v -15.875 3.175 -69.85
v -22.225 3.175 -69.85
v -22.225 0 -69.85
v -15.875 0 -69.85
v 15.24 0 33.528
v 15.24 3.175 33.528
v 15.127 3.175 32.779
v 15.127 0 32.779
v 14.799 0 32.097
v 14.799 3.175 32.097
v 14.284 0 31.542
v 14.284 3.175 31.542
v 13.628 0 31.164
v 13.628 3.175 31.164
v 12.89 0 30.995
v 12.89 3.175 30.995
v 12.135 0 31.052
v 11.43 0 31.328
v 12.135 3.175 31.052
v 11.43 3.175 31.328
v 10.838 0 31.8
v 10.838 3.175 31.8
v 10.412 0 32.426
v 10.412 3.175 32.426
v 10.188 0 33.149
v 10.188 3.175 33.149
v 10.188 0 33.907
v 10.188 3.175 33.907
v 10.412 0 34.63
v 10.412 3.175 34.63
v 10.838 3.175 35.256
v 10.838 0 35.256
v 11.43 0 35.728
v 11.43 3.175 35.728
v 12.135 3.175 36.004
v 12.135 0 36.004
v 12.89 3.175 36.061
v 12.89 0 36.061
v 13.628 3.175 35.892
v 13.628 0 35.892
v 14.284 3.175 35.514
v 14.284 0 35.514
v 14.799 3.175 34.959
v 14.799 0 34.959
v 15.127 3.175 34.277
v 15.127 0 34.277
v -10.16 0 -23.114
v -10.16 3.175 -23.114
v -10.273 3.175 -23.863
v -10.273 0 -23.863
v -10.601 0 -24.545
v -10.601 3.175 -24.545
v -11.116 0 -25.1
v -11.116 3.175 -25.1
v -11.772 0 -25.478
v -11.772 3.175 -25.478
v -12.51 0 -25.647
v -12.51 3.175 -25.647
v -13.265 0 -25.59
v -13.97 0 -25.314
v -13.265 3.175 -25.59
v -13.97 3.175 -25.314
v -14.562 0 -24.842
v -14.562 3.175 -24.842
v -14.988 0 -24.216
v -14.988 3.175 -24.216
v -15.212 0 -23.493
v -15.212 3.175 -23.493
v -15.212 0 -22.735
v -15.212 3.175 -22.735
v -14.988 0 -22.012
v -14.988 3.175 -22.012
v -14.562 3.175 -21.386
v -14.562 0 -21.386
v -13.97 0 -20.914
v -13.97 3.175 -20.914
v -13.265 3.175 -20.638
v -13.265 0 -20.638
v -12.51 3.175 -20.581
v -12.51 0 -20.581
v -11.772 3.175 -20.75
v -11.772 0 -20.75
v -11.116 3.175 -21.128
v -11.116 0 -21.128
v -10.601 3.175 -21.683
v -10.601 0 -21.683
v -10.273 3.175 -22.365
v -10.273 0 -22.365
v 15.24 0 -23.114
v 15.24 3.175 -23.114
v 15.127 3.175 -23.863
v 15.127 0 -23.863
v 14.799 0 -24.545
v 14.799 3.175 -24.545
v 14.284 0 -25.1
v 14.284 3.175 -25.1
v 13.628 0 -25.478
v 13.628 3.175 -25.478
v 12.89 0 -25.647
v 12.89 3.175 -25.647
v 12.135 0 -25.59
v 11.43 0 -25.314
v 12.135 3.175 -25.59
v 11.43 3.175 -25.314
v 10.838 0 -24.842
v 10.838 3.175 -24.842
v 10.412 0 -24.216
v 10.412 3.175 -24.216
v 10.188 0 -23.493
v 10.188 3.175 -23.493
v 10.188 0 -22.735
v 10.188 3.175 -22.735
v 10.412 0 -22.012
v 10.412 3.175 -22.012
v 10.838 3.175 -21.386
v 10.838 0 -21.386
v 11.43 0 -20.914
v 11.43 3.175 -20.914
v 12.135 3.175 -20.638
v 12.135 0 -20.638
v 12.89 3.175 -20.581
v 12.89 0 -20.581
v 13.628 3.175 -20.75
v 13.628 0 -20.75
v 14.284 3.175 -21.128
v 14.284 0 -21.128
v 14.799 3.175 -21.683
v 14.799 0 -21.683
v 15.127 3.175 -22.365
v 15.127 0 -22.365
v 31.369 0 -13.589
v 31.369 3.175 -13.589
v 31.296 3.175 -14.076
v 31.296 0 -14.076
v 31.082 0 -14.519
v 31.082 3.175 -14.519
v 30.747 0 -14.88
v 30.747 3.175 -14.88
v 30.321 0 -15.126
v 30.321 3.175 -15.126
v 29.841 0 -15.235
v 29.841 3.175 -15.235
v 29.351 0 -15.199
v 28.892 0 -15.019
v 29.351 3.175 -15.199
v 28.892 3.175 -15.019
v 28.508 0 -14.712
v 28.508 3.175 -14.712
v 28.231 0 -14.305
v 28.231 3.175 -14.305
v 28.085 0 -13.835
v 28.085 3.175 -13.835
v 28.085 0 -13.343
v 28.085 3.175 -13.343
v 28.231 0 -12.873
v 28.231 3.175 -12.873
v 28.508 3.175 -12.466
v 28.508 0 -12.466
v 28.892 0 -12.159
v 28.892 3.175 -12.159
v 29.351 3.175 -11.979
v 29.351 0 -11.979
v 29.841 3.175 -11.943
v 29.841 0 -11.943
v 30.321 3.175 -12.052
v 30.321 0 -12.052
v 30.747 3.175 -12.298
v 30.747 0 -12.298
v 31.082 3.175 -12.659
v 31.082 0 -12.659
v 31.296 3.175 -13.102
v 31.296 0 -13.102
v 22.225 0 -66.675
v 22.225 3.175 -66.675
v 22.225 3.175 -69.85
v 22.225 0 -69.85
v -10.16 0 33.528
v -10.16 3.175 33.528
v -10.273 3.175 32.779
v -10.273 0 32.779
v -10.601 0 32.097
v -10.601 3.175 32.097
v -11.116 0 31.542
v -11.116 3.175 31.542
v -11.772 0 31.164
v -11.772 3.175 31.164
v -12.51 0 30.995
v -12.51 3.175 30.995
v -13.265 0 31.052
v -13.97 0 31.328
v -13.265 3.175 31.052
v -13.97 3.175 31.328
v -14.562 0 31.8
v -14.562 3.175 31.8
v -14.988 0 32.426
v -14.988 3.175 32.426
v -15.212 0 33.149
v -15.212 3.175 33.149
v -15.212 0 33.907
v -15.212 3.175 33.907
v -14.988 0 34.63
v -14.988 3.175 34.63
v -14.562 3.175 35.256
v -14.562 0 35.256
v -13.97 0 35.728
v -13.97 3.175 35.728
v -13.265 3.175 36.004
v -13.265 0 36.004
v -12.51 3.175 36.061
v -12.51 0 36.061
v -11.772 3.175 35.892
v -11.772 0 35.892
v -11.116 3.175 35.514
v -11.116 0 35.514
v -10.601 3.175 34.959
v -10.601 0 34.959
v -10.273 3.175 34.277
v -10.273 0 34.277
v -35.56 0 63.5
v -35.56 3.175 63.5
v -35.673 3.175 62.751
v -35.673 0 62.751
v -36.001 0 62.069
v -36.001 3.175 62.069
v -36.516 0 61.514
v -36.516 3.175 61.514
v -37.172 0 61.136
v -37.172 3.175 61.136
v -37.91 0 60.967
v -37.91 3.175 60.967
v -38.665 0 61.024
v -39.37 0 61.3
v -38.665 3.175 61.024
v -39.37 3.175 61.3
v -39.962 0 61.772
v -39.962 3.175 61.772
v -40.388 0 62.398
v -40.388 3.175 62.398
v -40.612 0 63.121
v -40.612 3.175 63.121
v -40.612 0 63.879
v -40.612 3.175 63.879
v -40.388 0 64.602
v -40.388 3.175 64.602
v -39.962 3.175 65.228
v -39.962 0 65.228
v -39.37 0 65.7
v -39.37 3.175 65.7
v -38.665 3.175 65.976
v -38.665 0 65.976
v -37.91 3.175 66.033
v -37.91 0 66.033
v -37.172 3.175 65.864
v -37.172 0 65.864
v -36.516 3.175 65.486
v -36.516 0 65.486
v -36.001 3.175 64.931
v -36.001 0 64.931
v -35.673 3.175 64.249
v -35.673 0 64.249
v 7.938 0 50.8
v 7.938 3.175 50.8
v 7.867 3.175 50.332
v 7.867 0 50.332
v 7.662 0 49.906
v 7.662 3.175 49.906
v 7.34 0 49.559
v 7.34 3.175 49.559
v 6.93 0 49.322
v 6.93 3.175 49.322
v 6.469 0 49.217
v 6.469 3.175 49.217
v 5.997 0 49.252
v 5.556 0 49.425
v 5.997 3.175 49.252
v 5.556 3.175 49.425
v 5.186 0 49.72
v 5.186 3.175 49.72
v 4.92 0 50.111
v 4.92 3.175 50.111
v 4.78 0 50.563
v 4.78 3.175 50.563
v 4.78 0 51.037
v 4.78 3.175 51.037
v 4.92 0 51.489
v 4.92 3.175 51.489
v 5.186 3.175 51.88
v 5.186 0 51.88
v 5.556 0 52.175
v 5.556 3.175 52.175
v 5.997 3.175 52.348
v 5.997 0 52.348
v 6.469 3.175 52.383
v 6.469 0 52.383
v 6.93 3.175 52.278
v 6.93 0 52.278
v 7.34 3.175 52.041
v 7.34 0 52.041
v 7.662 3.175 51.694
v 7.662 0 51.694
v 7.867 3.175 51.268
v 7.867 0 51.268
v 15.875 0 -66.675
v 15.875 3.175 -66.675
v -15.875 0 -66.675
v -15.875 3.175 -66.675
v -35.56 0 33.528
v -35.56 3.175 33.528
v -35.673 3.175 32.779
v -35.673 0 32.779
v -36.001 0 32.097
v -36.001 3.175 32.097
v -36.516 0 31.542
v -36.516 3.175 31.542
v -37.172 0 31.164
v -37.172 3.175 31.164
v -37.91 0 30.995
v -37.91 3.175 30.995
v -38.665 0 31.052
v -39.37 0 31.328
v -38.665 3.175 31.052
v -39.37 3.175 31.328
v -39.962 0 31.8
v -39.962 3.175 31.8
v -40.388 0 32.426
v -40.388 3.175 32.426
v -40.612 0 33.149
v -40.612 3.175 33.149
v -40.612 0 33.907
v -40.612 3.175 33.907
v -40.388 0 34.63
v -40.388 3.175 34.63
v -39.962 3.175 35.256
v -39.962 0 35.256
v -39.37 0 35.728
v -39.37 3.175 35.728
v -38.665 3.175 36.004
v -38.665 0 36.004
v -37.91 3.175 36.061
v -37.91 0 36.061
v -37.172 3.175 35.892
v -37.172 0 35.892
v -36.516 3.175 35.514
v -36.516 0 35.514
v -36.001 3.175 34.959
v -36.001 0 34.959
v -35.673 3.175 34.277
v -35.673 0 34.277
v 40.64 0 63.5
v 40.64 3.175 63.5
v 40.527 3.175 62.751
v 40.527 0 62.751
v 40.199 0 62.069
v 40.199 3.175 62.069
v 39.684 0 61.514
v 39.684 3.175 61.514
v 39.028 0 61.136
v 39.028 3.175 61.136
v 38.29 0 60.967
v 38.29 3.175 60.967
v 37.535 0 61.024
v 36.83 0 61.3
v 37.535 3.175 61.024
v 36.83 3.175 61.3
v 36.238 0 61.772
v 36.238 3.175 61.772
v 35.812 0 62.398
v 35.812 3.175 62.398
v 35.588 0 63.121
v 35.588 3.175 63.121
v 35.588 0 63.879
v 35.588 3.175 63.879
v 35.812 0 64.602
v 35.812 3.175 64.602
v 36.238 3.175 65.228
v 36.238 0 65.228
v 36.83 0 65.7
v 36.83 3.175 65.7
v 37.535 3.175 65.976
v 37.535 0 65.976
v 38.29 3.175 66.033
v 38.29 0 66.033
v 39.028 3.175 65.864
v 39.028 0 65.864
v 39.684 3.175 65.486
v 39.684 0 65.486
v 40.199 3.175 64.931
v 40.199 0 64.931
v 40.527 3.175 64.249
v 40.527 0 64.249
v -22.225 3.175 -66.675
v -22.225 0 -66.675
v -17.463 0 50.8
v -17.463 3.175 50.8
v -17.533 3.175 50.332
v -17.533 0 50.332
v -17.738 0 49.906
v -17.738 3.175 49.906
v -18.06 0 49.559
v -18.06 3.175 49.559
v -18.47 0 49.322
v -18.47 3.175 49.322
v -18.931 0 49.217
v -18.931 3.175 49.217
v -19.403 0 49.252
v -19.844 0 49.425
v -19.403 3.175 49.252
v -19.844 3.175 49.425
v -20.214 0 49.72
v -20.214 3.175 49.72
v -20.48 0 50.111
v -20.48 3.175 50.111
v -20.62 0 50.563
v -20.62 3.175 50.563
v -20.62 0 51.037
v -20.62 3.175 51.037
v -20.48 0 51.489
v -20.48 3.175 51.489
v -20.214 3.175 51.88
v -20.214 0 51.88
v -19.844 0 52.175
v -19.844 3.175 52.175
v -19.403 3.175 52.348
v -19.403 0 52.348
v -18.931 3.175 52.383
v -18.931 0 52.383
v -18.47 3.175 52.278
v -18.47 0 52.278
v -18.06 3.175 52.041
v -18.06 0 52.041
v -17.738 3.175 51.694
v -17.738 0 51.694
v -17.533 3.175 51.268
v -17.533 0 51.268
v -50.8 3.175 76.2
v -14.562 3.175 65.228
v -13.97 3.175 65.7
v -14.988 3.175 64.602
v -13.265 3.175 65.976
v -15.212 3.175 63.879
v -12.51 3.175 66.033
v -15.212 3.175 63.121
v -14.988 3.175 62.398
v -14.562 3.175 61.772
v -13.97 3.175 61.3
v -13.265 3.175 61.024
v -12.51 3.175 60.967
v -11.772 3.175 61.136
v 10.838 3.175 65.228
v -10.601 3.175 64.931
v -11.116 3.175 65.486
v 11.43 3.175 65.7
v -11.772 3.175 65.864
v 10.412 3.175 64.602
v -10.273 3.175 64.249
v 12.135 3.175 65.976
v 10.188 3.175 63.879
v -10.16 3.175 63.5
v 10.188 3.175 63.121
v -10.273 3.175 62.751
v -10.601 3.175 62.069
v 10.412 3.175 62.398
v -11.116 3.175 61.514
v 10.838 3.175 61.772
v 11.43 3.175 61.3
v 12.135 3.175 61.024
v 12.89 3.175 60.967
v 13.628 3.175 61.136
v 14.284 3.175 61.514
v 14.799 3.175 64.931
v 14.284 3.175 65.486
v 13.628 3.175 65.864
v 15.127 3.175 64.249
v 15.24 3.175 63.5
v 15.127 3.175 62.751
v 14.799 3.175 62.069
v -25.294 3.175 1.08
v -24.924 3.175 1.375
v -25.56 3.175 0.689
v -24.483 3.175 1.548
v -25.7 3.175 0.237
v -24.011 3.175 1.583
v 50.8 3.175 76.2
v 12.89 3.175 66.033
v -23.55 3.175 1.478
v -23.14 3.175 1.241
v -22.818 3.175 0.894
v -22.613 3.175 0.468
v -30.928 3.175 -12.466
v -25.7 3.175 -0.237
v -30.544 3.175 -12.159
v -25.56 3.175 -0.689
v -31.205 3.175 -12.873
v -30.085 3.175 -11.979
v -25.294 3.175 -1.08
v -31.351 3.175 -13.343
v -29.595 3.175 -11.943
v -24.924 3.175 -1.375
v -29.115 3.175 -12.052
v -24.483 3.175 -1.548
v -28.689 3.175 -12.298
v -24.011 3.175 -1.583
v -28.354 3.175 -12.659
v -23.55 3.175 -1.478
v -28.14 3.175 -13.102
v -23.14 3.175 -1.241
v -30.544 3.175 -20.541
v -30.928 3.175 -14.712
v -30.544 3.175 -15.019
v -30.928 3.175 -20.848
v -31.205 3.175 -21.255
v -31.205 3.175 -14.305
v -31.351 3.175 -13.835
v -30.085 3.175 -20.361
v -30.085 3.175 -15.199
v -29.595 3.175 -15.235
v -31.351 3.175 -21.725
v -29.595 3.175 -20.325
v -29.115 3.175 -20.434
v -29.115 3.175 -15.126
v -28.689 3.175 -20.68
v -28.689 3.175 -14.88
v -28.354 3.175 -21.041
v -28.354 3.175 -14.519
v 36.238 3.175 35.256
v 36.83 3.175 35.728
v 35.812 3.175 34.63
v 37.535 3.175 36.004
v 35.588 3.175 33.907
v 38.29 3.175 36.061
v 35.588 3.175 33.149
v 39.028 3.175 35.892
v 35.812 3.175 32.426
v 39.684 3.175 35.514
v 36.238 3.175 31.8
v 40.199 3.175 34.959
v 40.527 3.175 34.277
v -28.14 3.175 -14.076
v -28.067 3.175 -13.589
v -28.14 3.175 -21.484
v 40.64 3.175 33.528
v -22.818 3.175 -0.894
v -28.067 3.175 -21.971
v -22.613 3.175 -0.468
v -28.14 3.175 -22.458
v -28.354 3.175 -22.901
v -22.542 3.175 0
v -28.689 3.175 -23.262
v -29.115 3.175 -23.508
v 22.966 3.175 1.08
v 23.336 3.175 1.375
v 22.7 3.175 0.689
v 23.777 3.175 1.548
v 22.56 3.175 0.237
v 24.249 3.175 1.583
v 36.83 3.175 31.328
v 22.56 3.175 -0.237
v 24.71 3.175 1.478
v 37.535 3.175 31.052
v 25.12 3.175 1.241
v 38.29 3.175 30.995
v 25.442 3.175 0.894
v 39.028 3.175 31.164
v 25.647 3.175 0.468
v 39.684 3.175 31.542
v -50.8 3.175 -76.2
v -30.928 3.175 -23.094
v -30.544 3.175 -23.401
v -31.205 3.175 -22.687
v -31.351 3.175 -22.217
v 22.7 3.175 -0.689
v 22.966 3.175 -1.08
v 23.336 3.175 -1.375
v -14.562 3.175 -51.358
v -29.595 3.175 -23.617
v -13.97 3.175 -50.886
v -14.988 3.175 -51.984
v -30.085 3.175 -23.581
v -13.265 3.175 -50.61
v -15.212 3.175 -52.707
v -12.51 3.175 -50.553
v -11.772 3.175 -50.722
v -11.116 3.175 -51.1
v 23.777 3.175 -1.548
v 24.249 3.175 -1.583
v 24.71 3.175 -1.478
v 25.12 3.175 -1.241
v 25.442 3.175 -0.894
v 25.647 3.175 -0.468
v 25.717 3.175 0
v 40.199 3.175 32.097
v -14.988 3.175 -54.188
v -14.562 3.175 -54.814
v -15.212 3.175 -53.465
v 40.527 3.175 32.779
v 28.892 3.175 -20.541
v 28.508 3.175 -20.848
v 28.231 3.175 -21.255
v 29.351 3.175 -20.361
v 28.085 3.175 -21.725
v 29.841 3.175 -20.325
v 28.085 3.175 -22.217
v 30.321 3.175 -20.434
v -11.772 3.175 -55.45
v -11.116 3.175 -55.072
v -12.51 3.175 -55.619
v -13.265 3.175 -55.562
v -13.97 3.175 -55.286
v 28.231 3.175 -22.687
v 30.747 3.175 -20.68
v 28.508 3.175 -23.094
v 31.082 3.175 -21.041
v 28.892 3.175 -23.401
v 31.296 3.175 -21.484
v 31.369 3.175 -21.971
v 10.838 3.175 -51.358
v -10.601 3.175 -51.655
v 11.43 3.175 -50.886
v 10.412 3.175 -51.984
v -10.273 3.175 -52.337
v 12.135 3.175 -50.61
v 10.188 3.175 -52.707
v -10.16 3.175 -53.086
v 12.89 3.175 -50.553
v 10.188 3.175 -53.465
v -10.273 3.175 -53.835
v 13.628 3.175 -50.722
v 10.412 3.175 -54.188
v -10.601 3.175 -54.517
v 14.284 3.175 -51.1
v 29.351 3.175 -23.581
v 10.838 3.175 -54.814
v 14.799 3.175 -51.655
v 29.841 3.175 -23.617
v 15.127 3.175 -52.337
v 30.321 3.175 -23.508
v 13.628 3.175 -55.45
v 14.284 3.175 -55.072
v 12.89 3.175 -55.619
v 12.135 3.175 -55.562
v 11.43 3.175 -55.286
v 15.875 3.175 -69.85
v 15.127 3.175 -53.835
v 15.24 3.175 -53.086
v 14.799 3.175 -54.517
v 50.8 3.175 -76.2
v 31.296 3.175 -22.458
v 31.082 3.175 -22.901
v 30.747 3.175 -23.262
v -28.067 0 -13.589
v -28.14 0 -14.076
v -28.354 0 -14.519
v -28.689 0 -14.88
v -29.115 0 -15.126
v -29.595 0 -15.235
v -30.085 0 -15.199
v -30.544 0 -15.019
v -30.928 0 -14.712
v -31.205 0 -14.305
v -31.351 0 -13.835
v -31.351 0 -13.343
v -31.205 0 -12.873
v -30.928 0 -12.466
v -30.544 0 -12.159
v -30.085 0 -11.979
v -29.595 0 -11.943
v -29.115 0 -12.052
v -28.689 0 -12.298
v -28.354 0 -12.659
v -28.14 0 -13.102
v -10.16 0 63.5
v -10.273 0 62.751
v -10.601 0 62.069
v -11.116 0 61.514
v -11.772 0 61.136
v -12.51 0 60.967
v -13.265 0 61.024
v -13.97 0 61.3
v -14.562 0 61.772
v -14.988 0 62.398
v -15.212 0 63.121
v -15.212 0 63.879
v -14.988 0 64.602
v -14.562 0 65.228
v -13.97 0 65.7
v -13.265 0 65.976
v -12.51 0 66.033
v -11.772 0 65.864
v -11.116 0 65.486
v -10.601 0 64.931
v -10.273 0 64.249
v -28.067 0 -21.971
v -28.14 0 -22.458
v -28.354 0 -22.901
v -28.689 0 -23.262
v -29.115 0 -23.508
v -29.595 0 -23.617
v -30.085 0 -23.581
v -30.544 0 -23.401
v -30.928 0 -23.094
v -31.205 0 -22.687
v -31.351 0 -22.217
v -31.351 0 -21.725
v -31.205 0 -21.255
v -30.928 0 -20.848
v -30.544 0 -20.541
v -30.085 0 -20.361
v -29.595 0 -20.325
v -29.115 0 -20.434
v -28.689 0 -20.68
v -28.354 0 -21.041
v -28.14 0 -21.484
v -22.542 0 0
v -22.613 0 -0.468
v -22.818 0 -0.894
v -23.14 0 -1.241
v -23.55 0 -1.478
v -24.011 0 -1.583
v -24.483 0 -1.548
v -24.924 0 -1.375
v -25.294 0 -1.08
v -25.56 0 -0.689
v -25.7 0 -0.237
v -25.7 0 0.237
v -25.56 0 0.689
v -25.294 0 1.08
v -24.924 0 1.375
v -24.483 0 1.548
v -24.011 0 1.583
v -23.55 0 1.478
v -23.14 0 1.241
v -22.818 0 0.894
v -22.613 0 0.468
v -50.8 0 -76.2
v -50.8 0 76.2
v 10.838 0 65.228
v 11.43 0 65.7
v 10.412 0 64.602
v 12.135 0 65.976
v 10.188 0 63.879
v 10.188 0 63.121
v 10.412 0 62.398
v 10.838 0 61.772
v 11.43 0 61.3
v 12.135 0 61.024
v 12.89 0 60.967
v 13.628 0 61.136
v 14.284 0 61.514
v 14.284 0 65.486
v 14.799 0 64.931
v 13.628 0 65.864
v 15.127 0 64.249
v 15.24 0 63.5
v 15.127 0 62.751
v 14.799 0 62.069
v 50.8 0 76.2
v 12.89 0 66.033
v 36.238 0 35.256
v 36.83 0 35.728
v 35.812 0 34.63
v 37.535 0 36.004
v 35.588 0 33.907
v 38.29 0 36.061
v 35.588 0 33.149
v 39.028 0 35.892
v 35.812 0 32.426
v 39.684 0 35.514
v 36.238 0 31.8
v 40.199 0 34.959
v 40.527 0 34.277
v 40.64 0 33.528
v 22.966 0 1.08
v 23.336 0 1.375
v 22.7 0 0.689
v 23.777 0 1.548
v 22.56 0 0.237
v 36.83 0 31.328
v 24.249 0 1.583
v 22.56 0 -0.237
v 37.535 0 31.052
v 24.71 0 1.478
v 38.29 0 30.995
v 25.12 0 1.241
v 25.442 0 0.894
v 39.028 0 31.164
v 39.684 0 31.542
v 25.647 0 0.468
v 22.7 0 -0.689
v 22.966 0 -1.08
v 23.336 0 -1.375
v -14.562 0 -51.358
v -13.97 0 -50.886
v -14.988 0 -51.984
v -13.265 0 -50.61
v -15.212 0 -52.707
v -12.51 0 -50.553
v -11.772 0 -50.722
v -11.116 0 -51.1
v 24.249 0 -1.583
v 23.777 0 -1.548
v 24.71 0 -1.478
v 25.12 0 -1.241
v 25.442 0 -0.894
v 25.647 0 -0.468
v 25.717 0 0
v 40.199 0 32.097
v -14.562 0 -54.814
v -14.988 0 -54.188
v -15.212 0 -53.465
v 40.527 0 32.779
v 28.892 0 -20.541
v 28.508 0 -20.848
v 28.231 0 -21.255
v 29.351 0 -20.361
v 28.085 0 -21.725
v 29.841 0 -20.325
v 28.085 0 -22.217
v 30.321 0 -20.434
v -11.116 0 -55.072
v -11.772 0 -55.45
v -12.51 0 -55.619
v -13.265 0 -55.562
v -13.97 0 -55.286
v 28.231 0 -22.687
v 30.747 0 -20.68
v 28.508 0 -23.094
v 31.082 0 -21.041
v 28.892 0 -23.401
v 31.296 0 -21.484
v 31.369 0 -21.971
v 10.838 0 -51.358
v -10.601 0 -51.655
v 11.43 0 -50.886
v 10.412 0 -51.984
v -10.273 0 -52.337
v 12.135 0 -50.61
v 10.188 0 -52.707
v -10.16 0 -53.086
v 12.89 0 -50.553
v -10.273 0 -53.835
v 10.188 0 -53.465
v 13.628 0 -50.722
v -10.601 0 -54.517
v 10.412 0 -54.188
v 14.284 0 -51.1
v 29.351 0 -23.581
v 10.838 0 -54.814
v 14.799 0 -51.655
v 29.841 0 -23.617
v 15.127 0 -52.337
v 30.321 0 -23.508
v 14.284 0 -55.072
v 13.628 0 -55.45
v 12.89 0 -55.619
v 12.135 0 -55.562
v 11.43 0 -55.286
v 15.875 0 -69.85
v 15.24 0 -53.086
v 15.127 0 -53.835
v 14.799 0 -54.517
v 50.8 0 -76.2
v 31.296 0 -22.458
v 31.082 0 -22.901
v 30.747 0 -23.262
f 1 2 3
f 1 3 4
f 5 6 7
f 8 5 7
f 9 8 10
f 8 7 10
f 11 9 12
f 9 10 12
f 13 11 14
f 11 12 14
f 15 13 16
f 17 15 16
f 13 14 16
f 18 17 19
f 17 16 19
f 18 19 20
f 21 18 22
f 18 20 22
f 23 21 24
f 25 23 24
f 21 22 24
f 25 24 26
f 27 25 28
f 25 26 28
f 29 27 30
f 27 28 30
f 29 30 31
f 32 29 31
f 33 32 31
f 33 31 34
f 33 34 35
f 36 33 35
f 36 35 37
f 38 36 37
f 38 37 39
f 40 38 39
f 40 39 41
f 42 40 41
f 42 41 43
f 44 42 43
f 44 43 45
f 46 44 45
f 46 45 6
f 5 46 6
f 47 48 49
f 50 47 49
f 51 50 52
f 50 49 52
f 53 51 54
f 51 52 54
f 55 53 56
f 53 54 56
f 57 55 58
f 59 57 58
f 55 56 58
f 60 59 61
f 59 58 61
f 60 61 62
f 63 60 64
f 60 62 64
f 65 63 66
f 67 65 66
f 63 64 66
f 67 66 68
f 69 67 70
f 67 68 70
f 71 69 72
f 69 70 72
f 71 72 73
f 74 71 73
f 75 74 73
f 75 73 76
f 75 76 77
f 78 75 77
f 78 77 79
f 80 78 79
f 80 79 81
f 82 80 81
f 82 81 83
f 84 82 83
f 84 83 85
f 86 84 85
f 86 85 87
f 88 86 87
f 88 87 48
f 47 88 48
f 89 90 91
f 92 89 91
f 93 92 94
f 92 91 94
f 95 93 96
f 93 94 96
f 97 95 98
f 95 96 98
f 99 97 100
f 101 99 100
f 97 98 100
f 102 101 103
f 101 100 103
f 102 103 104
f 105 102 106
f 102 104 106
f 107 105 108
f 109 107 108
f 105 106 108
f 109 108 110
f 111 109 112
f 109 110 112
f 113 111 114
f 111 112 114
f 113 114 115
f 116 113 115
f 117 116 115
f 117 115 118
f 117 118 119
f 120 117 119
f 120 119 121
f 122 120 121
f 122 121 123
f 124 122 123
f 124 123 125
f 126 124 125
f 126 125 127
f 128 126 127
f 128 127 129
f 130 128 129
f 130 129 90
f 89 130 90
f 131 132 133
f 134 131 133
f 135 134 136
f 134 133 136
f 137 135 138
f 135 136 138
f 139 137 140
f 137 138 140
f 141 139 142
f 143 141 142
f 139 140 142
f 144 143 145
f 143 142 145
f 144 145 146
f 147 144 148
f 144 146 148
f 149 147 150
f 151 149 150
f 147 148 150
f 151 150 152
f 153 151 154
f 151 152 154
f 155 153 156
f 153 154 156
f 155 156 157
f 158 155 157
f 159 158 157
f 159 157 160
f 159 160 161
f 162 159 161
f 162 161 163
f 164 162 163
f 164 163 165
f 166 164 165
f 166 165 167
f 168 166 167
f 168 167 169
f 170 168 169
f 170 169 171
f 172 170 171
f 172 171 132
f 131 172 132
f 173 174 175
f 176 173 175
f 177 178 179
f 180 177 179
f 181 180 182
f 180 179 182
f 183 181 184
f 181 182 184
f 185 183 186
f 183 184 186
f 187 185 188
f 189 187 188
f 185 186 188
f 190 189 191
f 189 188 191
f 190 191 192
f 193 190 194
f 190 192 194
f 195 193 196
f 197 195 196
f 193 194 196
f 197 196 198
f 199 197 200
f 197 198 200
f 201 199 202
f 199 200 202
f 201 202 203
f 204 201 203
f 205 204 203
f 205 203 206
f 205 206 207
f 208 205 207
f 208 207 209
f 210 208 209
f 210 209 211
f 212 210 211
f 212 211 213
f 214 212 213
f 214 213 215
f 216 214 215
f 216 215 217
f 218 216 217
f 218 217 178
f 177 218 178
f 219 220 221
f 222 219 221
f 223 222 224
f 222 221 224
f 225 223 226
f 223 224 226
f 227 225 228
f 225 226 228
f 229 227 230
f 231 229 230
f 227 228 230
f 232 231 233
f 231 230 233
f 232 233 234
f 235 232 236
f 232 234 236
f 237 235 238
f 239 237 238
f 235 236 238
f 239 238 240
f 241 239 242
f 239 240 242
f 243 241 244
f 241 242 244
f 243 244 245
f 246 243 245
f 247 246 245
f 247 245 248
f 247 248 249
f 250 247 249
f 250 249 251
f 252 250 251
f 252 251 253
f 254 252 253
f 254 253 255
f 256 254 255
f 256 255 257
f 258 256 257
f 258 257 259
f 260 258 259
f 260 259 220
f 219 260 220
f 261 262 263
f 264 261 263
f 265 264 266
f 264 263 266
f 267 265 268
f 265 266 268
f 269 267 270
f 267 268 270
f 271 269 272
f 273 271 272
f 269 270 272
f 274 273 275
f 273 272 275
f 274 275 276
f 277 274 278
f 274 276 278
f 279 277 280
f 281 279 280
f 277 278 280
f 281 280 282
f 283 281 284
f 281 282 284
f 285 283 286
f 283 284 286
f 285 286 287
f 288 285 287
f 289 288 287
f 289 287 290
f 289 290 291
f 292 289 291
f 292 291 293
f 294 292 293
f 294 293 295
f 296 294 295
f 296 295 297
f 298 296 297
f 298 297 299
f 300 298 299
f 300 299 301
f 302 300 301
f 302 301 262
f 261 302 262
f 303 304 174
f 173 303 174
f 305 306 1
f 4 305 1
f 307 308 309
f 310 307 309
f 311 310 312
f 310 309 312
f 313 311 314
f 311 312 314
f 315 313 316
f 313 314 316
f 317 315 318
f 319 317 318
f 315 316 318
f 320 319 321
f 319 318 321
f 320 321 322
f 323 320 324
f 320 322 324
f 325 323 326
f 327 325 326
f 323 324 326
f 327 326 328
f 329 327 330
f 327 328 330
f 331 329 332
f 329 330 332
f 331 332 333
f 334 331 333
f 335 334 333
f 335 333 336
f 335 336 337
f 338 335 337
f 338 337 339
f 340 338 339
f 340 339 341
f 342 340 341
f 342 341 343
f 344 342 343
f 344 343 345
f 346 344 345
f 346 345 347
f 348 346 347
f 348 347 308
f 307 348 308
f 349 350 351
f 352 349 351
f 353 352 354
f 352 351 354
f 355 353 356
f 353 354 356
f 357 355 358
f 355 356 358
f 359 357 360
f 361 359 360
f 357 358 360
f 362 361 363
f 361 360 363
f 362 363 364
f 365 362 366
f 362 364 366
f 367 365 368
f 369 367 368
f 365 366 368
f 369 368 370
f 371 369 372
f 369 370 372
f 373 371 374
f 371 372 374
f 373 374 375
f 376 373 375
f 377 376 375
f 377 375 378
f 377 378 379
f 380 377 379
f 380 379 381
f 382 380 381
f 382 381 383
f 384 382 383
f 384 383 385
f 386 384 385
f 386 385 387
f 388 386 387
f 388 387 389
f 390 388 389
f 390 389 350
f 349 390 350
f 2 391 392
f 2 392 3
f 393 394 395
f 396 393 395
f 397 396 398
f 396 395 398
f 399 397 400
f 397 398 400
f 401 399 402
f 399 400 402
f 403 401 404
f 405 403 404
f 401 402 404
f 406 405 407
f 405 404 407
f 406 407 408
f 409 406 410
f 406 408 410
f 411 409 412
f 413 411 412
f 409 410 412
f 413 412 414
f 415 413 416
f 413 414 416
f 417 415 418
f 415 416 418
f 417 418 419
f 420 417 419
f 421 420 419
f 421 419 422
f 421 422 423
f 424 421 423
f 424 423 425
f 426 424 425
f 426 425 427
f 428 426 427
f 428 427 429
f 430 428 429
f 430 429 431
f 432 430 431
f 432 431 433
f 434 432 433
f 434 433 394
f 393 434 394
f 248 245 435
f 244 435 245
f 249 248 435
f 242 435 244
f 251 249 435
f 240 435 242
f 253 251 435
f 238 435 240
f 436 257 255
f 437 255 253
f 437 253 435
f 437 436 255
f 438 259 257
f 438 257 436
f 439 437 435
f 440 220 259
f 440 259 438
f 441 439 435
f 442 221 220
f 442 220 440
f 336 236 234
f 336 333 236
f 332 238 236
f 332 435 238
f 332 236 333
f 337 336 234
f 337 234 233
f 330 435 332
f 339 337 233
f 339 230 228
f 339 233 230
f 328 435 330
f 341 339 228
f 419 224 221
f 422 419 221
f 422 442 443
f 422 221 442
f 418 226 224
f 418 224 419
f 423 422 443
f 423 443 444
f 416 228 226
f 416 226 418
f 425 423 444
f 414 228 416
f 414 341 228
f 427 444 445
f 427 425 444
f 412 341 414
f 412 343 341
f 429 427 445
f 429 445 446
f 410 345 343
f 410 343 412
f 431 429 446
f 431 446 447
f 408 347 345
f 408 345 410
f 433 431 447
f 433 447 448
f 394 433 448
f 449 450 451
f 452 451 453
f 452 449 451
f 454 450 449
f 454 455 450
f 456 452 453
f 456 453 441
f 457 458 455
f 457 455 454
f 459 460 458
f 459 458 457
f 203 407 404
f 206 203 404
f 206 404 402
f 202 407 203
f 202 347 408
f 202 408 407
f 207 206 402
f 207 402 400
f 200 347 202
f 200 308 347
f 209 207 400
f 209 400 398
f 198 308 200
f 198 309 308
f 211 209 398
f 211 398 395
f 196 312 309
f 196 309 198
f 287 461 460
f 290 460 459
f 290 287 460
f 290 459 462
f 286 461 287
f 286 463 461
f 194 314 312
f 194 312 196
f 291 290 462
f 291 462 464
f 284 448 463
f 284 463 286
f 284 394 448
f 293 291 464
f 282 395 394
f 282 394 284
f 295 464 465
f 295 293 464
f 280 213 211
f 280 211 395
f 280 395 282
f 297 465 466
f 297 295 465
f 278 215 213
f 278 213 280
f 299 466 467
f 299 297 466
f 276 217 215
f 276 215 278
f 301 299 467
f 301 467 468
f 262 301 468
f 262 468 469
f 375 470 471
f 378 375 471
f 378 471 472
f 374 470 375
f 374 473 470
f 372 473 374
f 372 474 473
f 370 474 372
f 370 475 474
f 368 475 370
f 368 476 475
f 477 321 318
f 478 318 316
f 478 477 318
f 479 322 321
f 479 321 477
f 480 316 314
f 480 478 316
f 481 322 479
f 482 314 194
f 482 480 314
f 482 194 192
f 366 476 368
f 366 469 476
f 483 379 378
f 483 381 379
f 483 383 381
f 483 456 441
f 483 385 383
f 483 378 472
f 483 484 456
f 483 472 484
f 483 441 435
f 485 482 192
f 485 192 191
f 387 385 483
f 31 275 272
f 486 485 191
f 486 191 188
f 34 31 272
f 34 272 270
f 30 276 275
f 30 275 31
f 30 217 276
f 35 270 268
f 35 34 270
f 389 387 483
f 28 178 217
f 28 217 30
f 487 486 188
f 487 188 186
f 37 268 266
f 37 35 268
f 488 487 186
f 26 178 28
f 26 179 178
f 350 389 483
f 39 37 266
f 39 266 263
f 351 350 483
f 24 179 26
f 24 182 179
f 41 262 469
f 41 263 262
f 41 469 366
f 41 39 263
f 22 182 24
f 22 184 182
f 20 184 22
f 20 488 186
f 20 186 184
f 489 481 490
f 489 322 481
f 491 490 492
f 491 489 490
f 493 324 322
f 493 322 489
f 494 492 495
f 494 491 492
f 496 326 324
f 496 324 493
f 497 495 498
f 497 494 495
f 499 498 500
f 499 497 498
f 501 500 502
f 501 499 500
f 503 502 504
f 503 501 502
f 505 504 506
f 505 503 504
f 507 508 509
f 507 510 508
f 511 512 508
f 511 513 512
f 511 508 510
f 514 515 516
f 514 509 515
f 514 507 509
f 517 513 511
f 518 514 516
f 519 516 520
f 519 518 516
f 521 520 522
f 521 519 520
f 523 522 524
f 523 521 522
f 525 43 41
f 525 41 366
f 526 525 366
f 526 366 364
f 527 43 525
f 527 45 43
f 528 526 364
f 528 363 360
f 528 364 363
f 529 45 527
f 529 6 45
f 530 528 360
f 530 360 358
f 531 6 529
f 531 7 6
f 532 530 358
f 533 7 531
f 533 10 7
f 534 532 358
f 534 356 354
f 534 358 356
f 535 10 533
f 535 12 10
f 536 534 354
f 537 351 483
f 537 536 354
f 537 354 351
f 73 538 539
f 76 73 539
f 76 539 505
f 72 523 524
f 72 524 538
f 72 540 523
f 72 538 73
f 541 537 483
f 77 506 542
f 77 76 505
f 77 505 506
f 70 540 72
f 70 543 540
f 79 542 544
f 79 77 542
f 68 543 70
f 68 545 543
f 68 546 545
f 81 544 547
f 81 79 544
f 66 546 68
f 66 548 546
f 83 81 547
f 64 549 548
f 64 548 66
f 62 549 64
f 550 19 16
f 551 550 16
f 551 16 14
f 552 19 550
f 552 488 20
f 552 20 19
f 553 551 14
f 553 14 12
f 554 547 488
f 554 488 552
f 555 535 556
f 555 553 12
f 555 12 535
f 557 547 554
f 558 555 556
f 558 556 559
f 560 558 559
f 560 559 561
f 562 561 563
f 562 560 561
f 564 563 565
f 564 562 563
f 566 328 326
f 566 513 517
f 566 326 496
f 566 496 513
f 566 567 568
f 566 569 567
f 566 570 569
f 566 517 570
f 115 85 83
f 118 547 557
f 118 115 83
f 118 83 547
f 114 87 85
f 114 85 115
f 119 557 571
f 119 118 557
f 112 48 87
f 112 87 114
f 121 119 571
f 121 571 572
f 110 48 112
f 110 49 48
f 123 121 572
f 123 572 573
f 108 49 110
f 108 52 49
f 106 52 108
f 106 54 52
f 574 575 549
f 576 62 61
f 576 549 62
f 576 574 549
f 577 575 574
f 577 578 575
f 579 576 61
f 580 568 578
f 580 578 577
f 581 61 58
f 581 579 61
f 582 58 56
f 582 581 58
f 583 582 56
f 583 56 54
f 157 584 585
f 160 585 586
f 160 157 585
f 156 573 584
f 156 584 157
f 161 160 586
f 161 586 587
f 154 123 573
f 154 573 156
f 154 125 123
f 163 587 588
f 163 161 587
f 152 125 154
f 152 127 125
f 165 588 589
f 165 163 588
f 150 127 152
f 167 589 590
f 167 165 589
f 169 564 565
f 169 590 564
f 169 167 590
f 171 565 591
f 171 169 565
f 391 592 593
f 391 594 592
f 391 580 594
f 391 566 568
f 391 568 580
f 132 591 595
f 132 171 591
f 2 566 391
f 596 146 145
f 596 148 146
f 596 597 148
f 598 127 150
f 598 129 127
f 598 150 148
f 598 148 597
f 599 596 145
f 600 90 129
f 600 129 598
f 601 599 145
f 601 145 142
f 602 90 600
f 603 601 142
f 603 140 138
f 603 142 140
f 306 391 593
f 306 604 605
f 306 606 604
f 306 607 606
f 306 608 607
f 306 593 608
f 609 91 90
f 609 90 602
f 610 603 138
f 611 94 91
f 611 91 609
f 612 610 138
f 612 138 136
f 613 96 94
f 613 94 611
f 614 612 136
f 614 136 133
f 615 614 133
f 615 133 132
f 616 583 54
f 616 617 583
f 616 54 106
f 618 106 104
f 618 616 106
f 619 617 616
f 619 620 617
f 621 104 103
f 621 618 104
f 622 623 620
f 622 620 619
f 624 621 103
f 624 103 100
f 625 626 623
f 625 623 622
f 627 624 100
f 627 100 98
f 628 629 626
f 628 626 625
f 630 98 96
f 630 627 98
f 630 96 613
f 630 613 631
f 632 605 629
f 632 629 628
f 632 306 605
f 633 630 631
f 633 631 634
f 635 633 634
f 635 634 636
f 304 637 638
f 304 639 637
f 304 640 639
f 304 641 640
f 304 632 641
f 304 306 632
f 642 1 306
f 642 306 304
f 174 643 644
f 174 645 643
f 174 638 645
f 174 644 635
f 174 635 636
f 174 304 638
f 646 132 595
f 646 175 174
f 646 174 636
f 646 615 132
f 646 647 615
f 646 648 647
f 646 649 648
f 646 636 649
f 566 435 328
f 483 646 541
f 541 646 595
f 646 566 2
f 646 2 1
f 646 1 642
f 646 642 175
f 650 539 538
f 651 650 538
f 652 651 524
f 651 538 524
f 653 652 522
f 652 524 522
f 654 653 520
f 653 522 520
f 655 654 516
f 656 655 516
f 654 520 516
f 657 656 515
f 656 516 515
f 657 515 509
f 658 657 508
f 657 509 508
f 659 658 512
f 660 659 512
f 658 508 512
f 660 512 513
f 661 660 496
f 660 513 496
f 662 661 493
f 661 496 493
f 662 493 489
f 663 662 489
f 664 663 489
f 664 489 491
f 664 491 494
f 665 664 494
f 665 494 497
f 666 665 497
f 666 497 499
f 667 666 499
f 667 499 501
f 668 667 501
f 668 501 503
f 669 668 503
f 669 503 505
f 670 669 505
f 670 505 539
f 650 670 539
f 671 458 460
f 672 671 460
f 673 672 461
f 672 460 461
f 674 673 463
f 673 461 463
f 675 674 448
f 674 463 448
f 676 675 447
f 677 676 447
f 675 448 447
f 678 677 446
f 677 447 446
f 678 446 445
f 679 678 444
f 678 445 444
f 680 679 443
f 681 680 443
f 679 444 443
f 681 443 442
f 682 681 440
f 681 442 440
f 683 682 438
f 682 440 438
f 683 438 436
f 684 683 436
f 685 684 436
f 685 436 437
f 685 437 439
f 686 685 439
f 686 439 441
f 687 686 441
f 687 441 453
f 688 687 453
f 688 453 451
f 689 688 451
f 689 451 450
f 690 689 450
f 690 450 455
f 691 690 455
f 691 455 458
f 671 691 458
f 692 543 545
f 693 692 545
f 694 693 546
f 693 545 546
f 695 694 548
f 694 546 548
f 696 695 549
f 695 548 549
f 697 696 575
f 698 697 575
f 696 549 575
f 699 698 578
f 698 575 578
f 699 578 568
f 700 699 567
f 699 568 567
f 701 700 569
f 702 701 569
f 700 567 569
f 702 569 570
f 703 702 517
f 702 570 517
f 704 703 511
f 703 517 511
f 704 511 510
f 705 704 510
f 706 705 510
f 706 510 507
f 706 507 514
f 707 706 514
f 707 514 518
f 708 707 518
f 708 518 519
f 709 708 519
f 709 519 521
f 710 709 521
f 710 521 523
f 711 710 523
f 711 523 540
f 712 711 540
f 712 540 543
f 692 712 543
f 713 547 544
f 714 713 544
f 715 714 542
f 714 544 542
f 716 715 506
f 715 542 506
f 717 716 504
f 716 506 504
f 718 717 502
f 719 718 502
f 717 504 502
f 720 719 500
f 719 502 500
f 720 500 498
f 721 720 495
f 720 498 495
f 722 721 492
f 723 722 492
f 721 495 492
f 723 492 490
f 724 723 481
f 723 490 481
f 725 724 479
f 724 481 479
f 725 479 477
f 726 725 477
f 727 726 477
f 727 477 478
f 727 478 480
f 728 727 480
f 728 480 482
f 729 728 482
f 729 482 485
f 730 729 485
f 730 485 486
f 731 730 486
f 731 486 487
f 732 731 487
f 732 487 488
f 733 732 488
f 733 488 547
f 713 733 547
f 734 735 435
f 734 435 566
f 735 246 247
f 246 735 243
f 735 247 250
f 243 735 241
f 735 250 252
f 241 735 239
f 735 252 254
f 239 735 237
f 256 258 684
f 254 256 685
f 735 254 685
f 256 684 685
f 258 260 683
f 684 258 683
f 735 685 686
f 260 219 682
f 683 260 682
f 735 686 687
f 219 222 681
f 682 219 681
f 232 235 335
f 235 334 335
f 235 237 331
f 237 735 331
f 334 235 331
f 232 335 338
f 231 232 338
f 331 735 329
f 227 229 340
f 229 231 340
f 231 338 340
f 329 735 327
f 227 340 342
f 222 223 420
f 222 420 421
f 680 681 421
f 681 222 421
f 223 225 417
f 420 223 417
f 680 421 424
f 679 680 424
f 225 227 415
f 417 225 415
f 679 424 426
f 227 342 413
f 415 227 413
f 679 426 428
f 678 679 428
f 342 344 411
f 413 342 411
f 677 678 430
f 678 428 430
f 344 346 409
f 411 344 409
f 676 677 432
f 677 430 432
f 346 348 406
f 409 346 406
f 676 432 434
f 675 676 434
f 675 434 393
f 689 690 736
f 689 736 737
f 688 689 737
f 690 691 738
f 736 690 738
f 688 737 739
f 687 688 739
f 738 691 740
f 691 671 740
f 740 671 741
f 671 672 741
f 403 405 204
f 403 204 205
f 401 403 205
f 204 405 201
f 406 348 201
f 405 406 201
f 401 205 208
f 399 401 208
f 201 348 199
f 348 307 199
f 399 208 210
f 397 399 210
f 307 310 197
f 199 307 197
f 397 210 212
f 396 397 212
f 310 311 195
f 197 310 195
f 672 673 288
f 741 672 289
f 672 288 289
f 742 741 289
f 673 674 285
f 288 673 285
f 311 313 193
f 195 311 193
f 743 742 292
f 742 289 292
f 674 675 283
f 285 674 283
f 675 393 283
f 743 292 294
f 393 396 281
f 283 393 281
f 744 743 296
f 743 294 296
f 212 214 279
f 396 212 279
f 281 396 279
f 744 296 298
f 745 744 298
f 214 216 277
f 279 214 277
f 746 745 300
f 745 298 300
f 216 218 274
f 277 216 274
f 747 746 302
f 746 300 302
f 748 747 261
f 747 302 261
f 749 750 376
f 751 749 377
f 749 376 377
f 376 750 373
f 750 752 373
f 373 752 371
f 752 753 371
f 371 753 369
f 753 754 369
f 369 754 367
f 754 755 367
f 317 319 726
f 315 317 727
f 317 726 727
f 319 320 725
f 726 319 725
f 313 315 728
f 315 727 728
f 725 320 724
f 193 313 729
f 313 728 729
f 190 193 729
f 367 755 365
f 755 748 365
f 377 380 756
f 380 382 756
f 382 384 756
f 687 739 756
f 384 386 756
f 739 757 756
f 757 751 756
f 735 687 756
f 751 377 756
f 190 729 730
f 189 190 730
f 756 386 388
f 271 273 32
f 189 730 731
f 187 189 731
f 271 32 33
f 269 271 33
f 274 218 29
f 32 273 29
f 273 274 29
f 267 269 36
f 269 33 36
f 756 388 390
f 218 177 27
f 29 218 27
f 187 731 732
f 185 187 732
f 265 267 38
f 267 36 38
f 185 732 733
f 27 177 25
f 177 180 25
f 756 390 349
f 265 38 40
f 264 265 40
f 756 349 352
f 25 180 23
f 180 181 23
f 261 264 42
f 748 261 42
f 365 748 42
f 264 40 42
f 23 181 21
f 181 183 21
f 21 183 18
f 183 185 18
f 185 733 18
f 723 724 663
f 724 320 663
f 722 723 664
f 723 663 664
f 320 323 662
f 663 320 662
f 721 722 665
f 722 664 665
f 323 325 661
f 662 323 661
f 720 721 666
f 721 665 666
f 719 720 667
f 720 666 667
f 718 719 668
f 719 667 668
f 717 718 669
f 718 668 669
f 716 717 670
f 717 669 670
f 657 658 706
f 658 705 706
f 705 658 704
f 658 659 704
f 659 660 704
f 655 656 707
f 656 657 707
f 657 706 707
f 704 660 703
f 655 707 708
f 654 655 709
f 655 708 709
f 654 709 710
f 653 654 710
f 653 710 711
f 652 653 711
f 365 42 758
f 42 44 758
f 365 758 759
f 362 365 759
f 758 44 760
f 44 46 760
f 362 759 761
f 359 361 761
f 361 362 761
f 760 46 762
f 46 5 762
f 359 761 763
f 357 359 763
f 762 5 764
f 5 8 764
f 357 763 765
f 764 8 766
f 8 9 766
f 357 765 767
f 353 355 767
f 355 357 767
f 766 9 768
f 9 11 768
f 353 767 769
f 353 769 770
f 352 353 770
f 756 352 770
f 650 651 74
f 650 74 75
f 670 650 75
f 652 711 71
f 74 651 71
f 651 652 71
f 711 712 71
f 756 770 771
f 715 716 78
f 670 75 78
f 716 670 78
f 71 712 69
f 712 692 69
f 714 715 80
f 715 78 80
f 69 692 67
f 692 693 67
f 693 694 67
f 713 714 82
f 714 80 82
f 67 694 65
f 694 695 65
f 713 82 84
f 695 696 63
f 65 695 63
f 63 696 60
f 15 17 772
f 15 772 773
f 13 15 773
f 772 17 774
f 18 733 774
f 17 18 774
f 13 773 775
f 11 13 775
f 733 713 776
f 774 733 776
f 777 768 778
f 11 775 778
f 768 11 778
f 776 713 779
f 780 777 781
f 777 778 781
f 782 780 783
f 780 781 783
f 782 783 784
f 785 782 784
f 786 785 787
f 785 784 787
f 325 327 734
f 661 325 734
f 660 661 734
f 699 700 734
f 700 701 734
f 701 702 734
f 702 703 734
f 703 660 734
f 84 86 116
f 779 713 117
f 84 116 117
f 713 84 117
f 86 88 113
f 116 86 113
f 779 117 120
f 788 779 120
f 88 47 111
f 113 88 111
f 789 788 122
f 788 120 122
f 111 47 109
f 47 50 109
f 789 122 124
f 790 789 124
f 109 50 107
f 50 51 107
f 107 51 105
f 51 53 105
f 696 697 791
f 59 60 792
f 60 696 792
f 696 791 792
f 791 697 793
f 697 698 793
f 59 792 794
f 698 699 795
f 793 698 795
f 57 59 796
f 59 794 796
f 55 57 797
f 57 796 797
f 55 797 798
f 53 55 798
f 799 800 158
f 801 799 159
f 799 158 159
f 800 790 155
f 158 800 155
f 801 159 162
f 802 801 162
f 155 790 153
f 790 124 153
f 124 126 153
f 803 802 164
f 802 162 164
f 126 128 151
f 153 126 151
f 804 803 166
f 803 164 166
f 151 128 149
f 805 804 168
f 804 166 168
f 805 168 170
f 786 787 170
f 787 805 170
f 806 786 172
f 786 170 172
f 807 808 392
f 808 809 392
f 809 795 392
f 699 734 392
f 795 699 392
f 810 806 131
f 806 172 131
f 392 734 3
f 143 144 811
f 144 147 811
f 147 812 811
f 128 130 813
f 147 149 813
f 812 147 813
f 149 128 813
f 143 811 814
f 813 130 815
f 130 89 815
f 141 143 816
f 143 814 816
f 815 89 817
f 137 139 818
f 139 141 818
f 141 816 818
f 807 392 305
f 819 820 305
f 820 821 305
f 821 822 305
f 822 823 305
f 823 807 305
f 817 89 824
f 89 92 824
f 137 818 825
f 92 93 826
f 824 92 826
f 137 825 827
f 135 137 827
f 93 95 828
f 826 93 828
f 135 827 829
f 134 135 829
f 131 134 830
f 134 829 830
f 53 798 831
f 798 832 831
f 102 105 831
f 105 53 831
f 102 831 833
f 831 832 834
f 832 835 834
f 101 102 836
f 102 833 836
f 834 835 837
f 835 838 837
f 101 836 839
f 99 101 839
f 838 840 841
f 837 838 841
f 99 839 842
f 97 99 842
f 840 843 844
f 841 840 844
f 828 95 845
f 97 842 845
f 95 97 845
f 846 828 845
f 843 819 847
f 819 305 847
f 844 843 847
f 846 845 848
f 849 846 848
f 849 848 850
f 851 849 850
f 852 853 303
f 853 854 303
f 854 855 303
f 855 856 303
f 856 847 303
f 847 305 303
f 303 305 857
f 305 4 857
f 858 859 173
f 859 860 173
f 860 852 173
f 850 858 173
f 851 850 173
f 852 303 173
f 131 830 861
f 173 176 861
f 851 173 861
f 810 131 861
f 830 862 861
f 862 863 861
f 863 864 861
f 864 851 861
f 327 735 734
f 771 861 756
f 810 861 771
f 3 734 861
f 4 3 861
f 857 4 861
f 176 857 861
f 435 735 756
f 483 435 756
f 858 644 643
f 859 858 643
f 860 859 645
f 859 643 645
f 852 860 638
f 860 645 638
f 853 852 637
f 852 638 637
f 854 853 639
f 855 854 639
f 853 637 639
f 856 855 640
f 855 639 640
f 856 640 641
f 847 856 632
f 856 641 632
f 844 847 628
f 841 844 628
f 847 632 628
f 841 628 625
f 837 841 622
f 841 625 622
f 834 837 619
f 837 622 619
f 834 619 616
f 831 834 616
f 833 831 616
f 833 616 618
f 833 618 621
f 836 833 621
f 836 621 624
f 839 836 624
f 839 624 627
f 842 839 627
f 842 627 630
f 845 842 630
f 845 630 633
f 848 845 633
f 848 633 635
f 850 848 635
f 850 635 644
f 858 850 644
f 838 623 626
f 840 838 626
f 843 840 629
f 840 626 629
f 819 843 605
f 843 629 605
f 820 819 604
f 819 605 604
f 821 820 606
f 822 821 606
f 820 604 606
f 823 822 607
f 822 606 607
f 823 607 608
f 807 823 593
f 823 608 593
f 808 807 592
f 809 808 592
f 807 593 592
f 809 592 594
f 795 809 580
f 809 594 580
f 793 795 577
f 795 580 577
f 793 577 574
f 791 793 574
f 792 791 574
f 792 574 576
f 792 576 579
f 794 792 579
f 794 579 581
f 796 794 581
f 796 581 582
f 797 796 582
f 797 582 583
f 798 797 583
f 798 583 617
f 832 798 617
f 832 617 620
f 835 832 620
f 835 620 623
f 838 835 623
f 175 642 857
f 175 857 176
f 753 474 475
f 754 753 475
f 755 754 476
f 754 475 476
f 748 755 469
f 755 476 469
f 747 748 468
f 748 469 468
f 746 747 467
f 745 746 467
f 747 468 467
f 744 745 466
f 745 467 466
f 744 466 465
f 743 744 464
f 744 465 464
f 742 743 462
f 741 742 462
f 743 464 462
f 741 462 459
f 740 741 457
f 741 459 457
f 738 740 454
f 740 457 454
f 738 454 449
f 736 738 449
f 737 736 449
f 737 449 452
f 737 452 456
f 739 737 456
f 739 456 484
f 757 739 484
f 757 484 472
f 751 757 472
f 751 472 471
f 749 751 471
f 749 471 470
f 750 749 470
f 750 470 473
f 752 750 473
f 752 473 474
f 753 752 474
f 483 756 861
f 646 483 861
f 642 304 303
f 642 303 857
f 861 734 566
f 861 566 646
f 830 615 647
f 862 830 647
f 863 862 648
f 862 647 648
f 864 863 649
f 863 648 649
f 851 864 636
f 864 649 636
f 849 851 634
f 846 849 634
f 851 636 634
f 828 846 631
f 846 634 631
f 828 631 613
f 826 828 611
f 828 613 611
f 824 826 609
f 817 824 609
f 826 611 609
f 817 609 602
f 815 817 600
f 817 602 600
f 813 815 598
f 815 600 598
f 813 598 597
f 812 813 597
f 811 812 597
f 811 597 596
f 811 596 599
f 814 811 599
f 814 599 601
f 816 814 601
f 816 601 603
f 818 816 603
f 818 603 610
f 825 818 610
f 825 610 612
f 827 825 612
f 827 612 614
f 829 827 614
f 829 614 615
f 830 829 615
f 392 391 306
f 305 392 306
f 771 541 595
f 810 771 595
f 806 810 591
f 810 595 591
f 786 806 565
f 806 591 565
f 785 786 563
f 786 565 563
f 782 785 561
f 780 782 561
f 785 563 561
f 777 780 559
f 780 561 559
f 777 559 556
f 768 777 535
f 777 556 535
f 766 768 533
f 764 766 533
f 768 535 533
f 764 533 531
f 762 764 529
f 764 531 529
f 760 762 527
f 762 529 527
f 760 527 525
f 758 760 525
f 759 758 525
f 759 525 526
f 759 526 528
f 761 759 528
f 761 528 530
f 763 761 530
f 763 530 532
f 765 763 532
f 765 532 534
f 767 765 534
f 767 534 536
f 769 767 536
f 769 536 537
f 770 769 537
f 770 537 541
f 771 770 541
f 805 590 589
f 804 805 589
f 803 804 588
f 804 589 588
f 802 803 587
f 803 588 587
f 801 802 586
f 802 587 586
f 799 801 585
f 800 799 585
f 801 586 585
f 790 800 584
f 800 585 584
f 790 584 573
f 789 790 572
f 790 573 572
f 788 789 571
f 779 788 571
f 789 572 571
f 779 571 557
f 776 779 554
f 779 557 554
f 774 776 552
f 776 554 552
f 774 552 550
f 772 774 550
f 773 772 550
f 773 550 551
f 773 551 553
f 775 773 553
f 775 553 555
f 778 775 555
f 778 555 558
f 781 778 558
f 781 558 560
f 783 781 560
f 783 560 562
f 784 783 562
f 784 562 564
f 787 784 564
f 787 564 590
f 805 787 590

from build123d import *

# Parameters (mm, degrees)
SKETCH2_W           = 101.6
SKETCH2_H           = 152.4
BOSS_EXTRUDE1_DEPTH = 3.175
SKETCH3_R           = 2.54
CUT_EXTRUDE1_DEPTH  = 4.175
SKETCH4_R           = 1.651
CUT_EXTRUDE2_DEPTH  = 4.175
SKETCH5_R           = 1.5875
CUT_EXTRUDE3_DEPTH  = 4.175
SKETCH6_W           = 6.35
SKETCH6_H           = 3.175
CUT_EXTRUDE4_DEPTH  = 4.175


with BuildPart() as part:
    # Sketch2 → Boss-Extrude1 (new body)
    with BuildSketch(Plane(origin=(0, 0, 0), x_dir=(1, 0, 0), z_dir=(0, 1, 0))):
        Rectangle(SKETCH2_W, SKETCH2_H)
    extrude(amount=BOSS_EXTRUDE1_DEPTH)

    # Sketch3 → Cut-Extrude1 (cut, through all)
    with BuildSketch(Plane(origin=(0, 3.175, 0), x_dir=(1, 0, 0), z_dir=(0, 1, 0))):
        with Locations((-38.1, -63.5)):
            Circle(SKETCH3_R)
        with Locations((-12.7, -63.5)):
            Circle(SKETCH3_R)
        with Locations((12.7, -63.5)):
            Circle(SKETCH3_R)
        with Locations((38.1, -63.5)):
            Circle(SKETCH3_R)
        with Locations((-38.1, -33.528)):
            Circle(SKETCH3_R)
        with Locations((-12.7, -33.528)):
            Circle(SKETCH3_R)
        with Locations((12.7, -33.528)):
            Circle(SKETCH3_R)
        with Locations((38.1, -33.528)):
            Circle(SKETCH3_R)
        with Locations((-12.7, 53.086)):
            Circle(SKETCH3_R)
        with Locations((-12.7, 23.114)):
            Circle(SKETCH3_R)
        with Locations((12.7, 23.114)):
            Circle(SKETCH3_R)
        with Locations((12.7, 53.086)):
            Circle(SKETCH3_R)
    extrude(amount=-CUT_EXTRUDE1_DEPTH, mode=Mode.SUBTRACT)

    # Sketch4 → Cut-Extrude2 (cut, through all)
    with BuildSketch(Plane(origin=(0, 3.175, 0), x_dir=(1, 0, 0), z_dir=(0, 1, 0))):
        with Locations((29.718, 13.589)):
            Circle(SKETCH4_R)
        with Locations((29.718, 21.971)):
            Circle(SKETCH4_R)
        with Locations((-29.718, 21.971)):
            Circle(SKETCH4_R)
        with Locations((-29.718, 13.589)):
            Circle(SKETCH4_R)
    extrude(amount=-CUT_EXTRUDE2_DEPTH, mode=Mode.SUBTRACT)

    # Sketch5 → Cut-Extrude3 (cut, through all)
    with BuildSketch(Plane(origin=(0, 3.175, 0), x_dir=(1, 0, 0), z_dir=(0, 1, 0))):
        with Locations((-24.13, 0)):
            Circle(SKETCH5_R)
        with Locations((24.13, 0)):
            Circle(SKETCH5_R)
        with Locations((-19.05, -50.8)):
            Circle(SKETCH5_R)
        with Locations((6.35, -50.8)):
            Circle(SKETCH5_R)
    extrude(amount=-CUT_EXTRUDE3_DEPTH, mode=Mode.SUBTRACT)

    # Sketch6 → Cut-Extrude4 (cut, through all)
    with BuildSketch(Plane(origin=(0, 3.175, 0), x_dir=(1, 0, 0), z_dir=(0, 1, 0))):
        with Locations((19.05, 68.2625)):
            Rectangle(SKETCH6_W, SKETCH6_H)
        with Locations((-19.05, 68.2625)):
            Rectangle(SKETCH6_W, SKETCH6_H)
    extrude(amount=-CUT_EXTRUDE4_DEPTH, mode=Mode.SUBTRACT)


solid = part.part
